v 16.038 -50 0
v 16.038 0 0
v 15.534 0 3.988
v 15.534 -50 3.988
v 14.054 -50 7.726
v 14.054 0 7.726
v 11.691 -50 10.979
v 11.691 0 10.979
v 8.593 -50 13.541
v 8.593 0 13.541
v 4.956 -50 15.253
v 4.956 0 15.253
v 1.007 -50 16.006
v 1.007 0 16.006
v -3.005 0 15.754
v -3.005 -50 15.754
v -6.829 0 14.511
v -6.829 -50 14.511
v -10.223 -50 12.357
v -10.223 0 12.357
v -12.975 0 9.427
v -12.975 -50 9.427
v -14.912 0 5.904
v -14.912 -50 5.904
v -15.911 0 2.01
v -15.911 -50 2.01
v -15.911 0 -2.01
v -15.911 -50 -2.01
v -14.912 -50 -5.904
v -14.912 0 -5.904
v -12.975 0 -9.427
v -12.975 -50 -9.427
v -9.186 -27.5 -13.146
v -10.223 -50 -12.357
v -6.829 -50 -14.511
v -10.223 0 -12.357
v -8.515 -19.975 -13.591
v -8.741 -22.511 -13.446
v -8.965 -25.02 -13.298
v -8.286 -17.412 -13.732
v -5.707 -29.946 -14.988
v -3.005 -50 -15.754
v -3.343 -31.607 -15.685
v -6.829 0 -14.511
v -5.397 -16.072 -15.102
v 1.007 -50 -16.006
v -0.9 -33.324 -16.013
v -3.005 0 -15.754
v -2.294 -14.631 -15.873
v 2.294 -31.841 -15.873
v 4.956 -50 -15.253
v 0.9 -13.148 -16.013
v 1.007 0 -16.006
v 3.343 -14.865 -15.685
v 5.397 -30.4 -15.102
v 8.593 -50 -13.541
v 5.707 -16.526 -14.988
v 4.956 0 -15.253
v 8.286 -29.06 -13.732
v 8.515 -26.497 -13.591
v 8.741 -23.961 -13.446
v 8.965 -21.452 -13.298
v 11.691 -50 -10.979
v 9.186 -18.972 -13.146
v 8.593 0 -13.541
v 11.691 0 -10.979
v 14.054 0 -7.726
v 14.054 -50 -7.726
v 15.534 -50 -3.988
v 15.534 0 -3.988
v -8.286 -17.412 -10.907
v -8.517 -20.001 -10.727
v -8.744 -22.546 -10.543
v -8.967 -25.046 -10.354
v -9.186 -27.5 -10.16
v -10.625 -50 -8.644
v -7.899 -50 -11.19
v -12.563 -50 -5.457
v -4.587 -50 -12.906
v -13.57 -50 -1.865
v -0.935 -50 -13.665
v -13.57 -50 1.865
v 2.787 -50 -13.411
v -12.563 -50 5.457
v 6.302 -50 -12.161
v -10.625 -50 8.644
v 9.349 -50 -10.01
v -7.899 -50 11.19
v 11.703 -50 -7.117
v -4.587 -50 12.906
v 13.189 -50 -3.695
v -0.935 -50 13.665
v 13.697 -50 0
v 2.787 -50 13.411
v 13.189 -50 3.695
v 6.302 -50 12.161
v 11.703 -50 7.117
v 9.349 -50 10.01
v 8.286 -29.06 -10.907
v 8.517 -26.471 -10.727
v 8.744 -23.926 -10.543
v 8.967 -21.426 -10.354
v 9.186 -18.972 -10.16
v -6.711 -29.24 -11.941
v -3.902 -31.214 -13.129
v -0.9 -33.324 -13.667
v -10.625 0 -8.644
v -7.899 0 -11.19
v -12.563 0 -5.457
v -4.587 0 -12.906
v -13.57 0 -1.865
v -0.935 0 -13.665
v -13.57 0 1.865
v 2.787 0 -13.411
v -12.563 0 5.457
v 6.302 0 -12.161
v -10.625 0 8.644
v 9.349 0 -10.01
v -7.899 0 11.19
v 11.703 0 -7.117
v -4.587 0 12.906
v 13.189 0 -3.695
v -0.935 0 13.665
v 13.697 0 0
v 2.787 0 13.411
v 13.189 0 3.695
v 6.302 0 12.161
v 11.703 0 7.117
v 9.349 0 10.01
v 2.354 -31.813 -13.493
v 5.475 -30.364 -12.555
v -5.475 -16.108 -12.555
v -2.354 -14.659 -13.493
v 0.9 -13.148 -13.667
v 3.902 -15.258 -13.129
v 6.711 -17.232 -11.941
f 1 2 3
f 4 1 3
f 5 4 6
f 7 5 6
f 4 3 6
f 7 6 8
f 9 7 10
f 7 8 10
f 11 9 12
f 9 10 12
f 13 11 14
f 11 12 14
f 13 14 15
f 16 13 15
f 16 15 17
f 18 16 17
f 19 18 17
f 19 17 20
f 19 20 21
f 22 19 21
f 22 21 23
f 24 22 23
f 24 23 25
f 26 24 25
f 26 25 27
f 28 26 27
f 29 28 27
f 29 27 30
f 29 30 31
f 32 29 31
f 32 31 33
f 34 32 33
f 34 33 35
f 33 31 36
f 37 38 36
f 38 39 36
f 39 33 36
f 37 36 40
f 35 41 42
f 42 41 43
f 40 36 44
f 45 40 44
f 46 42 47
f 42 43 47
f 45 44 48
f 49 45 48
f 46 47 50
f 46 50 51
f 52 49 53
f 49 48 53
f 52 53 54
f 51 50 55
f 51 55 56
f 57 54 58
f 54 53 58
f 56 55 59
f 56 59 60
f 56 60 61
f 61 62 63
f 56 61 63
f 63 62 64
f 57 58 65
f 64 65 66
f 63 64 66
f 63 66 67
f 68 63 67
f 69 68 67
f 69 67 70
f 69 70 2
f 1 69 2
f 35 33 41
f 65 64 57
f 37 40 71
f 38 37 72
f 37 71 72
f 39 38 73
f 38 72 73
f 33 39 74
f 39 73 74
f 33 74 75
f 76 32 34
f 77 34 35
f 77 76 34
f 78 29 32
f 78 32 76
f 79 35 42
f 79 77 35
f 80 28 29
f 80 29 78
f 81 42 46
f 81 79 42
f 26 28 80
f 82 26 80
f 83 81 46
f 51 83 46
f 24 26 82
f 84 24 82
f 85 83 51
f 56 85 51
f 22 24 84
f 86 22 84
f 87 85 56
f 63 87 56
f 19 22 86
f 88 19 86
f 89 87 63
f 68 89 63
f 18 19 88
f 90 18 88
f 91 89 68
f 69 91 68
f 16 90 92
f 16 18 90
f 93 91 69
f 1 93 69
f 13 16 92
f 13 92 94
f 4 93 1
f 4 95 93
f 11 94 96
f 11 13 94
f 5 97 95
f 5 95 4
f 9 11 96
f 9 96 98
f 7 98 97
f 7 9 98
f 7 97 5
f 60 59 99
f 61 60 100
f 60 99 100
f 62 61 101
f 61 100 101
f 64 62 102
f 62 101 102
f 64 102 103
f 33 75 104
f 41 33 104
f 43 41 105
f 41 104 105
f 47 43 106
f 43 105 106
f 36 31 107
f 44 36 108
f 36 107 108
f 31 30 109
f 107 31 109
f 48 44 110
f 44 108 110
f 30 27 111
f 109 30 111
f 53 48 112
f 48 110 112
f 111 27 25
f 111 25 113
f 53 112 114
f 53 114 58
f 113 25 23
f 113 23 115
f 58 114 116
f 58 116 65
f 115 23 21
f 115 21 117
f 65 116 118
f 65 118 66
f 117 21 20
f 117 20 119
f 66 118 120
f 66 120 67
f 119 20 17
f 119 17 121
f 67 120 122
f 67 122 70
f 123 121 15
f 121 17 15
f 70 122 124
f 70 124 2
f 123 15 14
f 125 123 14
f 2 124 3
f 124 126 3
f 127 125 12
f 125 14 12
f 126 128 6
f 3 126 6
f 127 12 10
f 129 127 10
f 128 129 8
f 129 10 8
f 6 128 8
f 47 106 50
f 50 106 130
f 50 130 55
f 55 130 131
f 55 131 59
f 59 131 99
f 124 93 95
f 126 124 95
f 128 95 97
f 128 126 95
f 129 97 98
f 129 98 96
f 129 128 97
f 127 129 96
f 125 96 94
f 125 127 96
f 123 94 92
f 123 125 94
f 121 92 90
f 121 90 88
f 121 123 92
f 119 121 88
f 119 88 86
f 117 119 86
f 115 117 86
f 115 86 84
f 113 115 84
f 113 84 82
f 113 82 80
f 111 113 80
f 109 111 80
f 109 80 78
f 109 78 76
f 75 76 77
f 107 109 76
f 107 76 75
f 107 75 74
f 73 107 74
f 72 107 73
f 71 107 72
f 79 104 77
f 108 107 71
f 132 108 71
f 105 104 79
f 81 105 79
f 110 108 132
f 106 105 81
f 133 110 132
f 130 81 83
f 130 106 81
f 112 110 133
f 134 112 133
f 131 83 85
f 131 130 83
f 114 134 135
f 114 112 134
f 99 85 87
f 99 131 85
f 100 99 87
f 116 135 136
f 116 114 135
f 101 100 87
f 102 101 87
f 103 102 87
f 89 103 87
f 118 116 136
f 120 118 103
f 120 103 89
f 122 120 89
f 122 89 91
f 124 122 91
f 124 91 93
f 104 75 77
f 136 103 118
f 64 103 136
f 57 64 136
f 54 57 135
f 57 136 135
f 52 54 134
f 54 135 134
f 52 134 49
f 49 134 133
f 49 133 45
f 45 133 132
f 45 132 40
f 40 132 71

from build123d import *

# Parameters (mm, degrees)
SKETCH_R     = 16.037804
SKETCH_R_2   = 13.697081
PAD_DEPTH    = 50
POCKET_DEPTH = 18


with BuildPart() as part:
    # Sketch → Pad (new body)
    with BuildSketch(Plane.XZ):
        Circle(SKETCH_R)
        Circle(SKETCH_R_2, mode=Mode.SUBTRACT)
    extrude(amount=PAD_DEPTH)

    # Sketch001 → Pocket (cut)
    with BuildSketch(Plane.XY):
        Polygon((8.285895, -29.05966), (9.186356, -18.972051), (0.900461, -13.148425), (-8.285895, -17.412408), (-9.186356, -27.500017), (-0.900461, -33.323643), align=None)
    extrude(amount=-POCKET_DEPTH, mode=Mode.SUBTRACT)


solid = part.part
